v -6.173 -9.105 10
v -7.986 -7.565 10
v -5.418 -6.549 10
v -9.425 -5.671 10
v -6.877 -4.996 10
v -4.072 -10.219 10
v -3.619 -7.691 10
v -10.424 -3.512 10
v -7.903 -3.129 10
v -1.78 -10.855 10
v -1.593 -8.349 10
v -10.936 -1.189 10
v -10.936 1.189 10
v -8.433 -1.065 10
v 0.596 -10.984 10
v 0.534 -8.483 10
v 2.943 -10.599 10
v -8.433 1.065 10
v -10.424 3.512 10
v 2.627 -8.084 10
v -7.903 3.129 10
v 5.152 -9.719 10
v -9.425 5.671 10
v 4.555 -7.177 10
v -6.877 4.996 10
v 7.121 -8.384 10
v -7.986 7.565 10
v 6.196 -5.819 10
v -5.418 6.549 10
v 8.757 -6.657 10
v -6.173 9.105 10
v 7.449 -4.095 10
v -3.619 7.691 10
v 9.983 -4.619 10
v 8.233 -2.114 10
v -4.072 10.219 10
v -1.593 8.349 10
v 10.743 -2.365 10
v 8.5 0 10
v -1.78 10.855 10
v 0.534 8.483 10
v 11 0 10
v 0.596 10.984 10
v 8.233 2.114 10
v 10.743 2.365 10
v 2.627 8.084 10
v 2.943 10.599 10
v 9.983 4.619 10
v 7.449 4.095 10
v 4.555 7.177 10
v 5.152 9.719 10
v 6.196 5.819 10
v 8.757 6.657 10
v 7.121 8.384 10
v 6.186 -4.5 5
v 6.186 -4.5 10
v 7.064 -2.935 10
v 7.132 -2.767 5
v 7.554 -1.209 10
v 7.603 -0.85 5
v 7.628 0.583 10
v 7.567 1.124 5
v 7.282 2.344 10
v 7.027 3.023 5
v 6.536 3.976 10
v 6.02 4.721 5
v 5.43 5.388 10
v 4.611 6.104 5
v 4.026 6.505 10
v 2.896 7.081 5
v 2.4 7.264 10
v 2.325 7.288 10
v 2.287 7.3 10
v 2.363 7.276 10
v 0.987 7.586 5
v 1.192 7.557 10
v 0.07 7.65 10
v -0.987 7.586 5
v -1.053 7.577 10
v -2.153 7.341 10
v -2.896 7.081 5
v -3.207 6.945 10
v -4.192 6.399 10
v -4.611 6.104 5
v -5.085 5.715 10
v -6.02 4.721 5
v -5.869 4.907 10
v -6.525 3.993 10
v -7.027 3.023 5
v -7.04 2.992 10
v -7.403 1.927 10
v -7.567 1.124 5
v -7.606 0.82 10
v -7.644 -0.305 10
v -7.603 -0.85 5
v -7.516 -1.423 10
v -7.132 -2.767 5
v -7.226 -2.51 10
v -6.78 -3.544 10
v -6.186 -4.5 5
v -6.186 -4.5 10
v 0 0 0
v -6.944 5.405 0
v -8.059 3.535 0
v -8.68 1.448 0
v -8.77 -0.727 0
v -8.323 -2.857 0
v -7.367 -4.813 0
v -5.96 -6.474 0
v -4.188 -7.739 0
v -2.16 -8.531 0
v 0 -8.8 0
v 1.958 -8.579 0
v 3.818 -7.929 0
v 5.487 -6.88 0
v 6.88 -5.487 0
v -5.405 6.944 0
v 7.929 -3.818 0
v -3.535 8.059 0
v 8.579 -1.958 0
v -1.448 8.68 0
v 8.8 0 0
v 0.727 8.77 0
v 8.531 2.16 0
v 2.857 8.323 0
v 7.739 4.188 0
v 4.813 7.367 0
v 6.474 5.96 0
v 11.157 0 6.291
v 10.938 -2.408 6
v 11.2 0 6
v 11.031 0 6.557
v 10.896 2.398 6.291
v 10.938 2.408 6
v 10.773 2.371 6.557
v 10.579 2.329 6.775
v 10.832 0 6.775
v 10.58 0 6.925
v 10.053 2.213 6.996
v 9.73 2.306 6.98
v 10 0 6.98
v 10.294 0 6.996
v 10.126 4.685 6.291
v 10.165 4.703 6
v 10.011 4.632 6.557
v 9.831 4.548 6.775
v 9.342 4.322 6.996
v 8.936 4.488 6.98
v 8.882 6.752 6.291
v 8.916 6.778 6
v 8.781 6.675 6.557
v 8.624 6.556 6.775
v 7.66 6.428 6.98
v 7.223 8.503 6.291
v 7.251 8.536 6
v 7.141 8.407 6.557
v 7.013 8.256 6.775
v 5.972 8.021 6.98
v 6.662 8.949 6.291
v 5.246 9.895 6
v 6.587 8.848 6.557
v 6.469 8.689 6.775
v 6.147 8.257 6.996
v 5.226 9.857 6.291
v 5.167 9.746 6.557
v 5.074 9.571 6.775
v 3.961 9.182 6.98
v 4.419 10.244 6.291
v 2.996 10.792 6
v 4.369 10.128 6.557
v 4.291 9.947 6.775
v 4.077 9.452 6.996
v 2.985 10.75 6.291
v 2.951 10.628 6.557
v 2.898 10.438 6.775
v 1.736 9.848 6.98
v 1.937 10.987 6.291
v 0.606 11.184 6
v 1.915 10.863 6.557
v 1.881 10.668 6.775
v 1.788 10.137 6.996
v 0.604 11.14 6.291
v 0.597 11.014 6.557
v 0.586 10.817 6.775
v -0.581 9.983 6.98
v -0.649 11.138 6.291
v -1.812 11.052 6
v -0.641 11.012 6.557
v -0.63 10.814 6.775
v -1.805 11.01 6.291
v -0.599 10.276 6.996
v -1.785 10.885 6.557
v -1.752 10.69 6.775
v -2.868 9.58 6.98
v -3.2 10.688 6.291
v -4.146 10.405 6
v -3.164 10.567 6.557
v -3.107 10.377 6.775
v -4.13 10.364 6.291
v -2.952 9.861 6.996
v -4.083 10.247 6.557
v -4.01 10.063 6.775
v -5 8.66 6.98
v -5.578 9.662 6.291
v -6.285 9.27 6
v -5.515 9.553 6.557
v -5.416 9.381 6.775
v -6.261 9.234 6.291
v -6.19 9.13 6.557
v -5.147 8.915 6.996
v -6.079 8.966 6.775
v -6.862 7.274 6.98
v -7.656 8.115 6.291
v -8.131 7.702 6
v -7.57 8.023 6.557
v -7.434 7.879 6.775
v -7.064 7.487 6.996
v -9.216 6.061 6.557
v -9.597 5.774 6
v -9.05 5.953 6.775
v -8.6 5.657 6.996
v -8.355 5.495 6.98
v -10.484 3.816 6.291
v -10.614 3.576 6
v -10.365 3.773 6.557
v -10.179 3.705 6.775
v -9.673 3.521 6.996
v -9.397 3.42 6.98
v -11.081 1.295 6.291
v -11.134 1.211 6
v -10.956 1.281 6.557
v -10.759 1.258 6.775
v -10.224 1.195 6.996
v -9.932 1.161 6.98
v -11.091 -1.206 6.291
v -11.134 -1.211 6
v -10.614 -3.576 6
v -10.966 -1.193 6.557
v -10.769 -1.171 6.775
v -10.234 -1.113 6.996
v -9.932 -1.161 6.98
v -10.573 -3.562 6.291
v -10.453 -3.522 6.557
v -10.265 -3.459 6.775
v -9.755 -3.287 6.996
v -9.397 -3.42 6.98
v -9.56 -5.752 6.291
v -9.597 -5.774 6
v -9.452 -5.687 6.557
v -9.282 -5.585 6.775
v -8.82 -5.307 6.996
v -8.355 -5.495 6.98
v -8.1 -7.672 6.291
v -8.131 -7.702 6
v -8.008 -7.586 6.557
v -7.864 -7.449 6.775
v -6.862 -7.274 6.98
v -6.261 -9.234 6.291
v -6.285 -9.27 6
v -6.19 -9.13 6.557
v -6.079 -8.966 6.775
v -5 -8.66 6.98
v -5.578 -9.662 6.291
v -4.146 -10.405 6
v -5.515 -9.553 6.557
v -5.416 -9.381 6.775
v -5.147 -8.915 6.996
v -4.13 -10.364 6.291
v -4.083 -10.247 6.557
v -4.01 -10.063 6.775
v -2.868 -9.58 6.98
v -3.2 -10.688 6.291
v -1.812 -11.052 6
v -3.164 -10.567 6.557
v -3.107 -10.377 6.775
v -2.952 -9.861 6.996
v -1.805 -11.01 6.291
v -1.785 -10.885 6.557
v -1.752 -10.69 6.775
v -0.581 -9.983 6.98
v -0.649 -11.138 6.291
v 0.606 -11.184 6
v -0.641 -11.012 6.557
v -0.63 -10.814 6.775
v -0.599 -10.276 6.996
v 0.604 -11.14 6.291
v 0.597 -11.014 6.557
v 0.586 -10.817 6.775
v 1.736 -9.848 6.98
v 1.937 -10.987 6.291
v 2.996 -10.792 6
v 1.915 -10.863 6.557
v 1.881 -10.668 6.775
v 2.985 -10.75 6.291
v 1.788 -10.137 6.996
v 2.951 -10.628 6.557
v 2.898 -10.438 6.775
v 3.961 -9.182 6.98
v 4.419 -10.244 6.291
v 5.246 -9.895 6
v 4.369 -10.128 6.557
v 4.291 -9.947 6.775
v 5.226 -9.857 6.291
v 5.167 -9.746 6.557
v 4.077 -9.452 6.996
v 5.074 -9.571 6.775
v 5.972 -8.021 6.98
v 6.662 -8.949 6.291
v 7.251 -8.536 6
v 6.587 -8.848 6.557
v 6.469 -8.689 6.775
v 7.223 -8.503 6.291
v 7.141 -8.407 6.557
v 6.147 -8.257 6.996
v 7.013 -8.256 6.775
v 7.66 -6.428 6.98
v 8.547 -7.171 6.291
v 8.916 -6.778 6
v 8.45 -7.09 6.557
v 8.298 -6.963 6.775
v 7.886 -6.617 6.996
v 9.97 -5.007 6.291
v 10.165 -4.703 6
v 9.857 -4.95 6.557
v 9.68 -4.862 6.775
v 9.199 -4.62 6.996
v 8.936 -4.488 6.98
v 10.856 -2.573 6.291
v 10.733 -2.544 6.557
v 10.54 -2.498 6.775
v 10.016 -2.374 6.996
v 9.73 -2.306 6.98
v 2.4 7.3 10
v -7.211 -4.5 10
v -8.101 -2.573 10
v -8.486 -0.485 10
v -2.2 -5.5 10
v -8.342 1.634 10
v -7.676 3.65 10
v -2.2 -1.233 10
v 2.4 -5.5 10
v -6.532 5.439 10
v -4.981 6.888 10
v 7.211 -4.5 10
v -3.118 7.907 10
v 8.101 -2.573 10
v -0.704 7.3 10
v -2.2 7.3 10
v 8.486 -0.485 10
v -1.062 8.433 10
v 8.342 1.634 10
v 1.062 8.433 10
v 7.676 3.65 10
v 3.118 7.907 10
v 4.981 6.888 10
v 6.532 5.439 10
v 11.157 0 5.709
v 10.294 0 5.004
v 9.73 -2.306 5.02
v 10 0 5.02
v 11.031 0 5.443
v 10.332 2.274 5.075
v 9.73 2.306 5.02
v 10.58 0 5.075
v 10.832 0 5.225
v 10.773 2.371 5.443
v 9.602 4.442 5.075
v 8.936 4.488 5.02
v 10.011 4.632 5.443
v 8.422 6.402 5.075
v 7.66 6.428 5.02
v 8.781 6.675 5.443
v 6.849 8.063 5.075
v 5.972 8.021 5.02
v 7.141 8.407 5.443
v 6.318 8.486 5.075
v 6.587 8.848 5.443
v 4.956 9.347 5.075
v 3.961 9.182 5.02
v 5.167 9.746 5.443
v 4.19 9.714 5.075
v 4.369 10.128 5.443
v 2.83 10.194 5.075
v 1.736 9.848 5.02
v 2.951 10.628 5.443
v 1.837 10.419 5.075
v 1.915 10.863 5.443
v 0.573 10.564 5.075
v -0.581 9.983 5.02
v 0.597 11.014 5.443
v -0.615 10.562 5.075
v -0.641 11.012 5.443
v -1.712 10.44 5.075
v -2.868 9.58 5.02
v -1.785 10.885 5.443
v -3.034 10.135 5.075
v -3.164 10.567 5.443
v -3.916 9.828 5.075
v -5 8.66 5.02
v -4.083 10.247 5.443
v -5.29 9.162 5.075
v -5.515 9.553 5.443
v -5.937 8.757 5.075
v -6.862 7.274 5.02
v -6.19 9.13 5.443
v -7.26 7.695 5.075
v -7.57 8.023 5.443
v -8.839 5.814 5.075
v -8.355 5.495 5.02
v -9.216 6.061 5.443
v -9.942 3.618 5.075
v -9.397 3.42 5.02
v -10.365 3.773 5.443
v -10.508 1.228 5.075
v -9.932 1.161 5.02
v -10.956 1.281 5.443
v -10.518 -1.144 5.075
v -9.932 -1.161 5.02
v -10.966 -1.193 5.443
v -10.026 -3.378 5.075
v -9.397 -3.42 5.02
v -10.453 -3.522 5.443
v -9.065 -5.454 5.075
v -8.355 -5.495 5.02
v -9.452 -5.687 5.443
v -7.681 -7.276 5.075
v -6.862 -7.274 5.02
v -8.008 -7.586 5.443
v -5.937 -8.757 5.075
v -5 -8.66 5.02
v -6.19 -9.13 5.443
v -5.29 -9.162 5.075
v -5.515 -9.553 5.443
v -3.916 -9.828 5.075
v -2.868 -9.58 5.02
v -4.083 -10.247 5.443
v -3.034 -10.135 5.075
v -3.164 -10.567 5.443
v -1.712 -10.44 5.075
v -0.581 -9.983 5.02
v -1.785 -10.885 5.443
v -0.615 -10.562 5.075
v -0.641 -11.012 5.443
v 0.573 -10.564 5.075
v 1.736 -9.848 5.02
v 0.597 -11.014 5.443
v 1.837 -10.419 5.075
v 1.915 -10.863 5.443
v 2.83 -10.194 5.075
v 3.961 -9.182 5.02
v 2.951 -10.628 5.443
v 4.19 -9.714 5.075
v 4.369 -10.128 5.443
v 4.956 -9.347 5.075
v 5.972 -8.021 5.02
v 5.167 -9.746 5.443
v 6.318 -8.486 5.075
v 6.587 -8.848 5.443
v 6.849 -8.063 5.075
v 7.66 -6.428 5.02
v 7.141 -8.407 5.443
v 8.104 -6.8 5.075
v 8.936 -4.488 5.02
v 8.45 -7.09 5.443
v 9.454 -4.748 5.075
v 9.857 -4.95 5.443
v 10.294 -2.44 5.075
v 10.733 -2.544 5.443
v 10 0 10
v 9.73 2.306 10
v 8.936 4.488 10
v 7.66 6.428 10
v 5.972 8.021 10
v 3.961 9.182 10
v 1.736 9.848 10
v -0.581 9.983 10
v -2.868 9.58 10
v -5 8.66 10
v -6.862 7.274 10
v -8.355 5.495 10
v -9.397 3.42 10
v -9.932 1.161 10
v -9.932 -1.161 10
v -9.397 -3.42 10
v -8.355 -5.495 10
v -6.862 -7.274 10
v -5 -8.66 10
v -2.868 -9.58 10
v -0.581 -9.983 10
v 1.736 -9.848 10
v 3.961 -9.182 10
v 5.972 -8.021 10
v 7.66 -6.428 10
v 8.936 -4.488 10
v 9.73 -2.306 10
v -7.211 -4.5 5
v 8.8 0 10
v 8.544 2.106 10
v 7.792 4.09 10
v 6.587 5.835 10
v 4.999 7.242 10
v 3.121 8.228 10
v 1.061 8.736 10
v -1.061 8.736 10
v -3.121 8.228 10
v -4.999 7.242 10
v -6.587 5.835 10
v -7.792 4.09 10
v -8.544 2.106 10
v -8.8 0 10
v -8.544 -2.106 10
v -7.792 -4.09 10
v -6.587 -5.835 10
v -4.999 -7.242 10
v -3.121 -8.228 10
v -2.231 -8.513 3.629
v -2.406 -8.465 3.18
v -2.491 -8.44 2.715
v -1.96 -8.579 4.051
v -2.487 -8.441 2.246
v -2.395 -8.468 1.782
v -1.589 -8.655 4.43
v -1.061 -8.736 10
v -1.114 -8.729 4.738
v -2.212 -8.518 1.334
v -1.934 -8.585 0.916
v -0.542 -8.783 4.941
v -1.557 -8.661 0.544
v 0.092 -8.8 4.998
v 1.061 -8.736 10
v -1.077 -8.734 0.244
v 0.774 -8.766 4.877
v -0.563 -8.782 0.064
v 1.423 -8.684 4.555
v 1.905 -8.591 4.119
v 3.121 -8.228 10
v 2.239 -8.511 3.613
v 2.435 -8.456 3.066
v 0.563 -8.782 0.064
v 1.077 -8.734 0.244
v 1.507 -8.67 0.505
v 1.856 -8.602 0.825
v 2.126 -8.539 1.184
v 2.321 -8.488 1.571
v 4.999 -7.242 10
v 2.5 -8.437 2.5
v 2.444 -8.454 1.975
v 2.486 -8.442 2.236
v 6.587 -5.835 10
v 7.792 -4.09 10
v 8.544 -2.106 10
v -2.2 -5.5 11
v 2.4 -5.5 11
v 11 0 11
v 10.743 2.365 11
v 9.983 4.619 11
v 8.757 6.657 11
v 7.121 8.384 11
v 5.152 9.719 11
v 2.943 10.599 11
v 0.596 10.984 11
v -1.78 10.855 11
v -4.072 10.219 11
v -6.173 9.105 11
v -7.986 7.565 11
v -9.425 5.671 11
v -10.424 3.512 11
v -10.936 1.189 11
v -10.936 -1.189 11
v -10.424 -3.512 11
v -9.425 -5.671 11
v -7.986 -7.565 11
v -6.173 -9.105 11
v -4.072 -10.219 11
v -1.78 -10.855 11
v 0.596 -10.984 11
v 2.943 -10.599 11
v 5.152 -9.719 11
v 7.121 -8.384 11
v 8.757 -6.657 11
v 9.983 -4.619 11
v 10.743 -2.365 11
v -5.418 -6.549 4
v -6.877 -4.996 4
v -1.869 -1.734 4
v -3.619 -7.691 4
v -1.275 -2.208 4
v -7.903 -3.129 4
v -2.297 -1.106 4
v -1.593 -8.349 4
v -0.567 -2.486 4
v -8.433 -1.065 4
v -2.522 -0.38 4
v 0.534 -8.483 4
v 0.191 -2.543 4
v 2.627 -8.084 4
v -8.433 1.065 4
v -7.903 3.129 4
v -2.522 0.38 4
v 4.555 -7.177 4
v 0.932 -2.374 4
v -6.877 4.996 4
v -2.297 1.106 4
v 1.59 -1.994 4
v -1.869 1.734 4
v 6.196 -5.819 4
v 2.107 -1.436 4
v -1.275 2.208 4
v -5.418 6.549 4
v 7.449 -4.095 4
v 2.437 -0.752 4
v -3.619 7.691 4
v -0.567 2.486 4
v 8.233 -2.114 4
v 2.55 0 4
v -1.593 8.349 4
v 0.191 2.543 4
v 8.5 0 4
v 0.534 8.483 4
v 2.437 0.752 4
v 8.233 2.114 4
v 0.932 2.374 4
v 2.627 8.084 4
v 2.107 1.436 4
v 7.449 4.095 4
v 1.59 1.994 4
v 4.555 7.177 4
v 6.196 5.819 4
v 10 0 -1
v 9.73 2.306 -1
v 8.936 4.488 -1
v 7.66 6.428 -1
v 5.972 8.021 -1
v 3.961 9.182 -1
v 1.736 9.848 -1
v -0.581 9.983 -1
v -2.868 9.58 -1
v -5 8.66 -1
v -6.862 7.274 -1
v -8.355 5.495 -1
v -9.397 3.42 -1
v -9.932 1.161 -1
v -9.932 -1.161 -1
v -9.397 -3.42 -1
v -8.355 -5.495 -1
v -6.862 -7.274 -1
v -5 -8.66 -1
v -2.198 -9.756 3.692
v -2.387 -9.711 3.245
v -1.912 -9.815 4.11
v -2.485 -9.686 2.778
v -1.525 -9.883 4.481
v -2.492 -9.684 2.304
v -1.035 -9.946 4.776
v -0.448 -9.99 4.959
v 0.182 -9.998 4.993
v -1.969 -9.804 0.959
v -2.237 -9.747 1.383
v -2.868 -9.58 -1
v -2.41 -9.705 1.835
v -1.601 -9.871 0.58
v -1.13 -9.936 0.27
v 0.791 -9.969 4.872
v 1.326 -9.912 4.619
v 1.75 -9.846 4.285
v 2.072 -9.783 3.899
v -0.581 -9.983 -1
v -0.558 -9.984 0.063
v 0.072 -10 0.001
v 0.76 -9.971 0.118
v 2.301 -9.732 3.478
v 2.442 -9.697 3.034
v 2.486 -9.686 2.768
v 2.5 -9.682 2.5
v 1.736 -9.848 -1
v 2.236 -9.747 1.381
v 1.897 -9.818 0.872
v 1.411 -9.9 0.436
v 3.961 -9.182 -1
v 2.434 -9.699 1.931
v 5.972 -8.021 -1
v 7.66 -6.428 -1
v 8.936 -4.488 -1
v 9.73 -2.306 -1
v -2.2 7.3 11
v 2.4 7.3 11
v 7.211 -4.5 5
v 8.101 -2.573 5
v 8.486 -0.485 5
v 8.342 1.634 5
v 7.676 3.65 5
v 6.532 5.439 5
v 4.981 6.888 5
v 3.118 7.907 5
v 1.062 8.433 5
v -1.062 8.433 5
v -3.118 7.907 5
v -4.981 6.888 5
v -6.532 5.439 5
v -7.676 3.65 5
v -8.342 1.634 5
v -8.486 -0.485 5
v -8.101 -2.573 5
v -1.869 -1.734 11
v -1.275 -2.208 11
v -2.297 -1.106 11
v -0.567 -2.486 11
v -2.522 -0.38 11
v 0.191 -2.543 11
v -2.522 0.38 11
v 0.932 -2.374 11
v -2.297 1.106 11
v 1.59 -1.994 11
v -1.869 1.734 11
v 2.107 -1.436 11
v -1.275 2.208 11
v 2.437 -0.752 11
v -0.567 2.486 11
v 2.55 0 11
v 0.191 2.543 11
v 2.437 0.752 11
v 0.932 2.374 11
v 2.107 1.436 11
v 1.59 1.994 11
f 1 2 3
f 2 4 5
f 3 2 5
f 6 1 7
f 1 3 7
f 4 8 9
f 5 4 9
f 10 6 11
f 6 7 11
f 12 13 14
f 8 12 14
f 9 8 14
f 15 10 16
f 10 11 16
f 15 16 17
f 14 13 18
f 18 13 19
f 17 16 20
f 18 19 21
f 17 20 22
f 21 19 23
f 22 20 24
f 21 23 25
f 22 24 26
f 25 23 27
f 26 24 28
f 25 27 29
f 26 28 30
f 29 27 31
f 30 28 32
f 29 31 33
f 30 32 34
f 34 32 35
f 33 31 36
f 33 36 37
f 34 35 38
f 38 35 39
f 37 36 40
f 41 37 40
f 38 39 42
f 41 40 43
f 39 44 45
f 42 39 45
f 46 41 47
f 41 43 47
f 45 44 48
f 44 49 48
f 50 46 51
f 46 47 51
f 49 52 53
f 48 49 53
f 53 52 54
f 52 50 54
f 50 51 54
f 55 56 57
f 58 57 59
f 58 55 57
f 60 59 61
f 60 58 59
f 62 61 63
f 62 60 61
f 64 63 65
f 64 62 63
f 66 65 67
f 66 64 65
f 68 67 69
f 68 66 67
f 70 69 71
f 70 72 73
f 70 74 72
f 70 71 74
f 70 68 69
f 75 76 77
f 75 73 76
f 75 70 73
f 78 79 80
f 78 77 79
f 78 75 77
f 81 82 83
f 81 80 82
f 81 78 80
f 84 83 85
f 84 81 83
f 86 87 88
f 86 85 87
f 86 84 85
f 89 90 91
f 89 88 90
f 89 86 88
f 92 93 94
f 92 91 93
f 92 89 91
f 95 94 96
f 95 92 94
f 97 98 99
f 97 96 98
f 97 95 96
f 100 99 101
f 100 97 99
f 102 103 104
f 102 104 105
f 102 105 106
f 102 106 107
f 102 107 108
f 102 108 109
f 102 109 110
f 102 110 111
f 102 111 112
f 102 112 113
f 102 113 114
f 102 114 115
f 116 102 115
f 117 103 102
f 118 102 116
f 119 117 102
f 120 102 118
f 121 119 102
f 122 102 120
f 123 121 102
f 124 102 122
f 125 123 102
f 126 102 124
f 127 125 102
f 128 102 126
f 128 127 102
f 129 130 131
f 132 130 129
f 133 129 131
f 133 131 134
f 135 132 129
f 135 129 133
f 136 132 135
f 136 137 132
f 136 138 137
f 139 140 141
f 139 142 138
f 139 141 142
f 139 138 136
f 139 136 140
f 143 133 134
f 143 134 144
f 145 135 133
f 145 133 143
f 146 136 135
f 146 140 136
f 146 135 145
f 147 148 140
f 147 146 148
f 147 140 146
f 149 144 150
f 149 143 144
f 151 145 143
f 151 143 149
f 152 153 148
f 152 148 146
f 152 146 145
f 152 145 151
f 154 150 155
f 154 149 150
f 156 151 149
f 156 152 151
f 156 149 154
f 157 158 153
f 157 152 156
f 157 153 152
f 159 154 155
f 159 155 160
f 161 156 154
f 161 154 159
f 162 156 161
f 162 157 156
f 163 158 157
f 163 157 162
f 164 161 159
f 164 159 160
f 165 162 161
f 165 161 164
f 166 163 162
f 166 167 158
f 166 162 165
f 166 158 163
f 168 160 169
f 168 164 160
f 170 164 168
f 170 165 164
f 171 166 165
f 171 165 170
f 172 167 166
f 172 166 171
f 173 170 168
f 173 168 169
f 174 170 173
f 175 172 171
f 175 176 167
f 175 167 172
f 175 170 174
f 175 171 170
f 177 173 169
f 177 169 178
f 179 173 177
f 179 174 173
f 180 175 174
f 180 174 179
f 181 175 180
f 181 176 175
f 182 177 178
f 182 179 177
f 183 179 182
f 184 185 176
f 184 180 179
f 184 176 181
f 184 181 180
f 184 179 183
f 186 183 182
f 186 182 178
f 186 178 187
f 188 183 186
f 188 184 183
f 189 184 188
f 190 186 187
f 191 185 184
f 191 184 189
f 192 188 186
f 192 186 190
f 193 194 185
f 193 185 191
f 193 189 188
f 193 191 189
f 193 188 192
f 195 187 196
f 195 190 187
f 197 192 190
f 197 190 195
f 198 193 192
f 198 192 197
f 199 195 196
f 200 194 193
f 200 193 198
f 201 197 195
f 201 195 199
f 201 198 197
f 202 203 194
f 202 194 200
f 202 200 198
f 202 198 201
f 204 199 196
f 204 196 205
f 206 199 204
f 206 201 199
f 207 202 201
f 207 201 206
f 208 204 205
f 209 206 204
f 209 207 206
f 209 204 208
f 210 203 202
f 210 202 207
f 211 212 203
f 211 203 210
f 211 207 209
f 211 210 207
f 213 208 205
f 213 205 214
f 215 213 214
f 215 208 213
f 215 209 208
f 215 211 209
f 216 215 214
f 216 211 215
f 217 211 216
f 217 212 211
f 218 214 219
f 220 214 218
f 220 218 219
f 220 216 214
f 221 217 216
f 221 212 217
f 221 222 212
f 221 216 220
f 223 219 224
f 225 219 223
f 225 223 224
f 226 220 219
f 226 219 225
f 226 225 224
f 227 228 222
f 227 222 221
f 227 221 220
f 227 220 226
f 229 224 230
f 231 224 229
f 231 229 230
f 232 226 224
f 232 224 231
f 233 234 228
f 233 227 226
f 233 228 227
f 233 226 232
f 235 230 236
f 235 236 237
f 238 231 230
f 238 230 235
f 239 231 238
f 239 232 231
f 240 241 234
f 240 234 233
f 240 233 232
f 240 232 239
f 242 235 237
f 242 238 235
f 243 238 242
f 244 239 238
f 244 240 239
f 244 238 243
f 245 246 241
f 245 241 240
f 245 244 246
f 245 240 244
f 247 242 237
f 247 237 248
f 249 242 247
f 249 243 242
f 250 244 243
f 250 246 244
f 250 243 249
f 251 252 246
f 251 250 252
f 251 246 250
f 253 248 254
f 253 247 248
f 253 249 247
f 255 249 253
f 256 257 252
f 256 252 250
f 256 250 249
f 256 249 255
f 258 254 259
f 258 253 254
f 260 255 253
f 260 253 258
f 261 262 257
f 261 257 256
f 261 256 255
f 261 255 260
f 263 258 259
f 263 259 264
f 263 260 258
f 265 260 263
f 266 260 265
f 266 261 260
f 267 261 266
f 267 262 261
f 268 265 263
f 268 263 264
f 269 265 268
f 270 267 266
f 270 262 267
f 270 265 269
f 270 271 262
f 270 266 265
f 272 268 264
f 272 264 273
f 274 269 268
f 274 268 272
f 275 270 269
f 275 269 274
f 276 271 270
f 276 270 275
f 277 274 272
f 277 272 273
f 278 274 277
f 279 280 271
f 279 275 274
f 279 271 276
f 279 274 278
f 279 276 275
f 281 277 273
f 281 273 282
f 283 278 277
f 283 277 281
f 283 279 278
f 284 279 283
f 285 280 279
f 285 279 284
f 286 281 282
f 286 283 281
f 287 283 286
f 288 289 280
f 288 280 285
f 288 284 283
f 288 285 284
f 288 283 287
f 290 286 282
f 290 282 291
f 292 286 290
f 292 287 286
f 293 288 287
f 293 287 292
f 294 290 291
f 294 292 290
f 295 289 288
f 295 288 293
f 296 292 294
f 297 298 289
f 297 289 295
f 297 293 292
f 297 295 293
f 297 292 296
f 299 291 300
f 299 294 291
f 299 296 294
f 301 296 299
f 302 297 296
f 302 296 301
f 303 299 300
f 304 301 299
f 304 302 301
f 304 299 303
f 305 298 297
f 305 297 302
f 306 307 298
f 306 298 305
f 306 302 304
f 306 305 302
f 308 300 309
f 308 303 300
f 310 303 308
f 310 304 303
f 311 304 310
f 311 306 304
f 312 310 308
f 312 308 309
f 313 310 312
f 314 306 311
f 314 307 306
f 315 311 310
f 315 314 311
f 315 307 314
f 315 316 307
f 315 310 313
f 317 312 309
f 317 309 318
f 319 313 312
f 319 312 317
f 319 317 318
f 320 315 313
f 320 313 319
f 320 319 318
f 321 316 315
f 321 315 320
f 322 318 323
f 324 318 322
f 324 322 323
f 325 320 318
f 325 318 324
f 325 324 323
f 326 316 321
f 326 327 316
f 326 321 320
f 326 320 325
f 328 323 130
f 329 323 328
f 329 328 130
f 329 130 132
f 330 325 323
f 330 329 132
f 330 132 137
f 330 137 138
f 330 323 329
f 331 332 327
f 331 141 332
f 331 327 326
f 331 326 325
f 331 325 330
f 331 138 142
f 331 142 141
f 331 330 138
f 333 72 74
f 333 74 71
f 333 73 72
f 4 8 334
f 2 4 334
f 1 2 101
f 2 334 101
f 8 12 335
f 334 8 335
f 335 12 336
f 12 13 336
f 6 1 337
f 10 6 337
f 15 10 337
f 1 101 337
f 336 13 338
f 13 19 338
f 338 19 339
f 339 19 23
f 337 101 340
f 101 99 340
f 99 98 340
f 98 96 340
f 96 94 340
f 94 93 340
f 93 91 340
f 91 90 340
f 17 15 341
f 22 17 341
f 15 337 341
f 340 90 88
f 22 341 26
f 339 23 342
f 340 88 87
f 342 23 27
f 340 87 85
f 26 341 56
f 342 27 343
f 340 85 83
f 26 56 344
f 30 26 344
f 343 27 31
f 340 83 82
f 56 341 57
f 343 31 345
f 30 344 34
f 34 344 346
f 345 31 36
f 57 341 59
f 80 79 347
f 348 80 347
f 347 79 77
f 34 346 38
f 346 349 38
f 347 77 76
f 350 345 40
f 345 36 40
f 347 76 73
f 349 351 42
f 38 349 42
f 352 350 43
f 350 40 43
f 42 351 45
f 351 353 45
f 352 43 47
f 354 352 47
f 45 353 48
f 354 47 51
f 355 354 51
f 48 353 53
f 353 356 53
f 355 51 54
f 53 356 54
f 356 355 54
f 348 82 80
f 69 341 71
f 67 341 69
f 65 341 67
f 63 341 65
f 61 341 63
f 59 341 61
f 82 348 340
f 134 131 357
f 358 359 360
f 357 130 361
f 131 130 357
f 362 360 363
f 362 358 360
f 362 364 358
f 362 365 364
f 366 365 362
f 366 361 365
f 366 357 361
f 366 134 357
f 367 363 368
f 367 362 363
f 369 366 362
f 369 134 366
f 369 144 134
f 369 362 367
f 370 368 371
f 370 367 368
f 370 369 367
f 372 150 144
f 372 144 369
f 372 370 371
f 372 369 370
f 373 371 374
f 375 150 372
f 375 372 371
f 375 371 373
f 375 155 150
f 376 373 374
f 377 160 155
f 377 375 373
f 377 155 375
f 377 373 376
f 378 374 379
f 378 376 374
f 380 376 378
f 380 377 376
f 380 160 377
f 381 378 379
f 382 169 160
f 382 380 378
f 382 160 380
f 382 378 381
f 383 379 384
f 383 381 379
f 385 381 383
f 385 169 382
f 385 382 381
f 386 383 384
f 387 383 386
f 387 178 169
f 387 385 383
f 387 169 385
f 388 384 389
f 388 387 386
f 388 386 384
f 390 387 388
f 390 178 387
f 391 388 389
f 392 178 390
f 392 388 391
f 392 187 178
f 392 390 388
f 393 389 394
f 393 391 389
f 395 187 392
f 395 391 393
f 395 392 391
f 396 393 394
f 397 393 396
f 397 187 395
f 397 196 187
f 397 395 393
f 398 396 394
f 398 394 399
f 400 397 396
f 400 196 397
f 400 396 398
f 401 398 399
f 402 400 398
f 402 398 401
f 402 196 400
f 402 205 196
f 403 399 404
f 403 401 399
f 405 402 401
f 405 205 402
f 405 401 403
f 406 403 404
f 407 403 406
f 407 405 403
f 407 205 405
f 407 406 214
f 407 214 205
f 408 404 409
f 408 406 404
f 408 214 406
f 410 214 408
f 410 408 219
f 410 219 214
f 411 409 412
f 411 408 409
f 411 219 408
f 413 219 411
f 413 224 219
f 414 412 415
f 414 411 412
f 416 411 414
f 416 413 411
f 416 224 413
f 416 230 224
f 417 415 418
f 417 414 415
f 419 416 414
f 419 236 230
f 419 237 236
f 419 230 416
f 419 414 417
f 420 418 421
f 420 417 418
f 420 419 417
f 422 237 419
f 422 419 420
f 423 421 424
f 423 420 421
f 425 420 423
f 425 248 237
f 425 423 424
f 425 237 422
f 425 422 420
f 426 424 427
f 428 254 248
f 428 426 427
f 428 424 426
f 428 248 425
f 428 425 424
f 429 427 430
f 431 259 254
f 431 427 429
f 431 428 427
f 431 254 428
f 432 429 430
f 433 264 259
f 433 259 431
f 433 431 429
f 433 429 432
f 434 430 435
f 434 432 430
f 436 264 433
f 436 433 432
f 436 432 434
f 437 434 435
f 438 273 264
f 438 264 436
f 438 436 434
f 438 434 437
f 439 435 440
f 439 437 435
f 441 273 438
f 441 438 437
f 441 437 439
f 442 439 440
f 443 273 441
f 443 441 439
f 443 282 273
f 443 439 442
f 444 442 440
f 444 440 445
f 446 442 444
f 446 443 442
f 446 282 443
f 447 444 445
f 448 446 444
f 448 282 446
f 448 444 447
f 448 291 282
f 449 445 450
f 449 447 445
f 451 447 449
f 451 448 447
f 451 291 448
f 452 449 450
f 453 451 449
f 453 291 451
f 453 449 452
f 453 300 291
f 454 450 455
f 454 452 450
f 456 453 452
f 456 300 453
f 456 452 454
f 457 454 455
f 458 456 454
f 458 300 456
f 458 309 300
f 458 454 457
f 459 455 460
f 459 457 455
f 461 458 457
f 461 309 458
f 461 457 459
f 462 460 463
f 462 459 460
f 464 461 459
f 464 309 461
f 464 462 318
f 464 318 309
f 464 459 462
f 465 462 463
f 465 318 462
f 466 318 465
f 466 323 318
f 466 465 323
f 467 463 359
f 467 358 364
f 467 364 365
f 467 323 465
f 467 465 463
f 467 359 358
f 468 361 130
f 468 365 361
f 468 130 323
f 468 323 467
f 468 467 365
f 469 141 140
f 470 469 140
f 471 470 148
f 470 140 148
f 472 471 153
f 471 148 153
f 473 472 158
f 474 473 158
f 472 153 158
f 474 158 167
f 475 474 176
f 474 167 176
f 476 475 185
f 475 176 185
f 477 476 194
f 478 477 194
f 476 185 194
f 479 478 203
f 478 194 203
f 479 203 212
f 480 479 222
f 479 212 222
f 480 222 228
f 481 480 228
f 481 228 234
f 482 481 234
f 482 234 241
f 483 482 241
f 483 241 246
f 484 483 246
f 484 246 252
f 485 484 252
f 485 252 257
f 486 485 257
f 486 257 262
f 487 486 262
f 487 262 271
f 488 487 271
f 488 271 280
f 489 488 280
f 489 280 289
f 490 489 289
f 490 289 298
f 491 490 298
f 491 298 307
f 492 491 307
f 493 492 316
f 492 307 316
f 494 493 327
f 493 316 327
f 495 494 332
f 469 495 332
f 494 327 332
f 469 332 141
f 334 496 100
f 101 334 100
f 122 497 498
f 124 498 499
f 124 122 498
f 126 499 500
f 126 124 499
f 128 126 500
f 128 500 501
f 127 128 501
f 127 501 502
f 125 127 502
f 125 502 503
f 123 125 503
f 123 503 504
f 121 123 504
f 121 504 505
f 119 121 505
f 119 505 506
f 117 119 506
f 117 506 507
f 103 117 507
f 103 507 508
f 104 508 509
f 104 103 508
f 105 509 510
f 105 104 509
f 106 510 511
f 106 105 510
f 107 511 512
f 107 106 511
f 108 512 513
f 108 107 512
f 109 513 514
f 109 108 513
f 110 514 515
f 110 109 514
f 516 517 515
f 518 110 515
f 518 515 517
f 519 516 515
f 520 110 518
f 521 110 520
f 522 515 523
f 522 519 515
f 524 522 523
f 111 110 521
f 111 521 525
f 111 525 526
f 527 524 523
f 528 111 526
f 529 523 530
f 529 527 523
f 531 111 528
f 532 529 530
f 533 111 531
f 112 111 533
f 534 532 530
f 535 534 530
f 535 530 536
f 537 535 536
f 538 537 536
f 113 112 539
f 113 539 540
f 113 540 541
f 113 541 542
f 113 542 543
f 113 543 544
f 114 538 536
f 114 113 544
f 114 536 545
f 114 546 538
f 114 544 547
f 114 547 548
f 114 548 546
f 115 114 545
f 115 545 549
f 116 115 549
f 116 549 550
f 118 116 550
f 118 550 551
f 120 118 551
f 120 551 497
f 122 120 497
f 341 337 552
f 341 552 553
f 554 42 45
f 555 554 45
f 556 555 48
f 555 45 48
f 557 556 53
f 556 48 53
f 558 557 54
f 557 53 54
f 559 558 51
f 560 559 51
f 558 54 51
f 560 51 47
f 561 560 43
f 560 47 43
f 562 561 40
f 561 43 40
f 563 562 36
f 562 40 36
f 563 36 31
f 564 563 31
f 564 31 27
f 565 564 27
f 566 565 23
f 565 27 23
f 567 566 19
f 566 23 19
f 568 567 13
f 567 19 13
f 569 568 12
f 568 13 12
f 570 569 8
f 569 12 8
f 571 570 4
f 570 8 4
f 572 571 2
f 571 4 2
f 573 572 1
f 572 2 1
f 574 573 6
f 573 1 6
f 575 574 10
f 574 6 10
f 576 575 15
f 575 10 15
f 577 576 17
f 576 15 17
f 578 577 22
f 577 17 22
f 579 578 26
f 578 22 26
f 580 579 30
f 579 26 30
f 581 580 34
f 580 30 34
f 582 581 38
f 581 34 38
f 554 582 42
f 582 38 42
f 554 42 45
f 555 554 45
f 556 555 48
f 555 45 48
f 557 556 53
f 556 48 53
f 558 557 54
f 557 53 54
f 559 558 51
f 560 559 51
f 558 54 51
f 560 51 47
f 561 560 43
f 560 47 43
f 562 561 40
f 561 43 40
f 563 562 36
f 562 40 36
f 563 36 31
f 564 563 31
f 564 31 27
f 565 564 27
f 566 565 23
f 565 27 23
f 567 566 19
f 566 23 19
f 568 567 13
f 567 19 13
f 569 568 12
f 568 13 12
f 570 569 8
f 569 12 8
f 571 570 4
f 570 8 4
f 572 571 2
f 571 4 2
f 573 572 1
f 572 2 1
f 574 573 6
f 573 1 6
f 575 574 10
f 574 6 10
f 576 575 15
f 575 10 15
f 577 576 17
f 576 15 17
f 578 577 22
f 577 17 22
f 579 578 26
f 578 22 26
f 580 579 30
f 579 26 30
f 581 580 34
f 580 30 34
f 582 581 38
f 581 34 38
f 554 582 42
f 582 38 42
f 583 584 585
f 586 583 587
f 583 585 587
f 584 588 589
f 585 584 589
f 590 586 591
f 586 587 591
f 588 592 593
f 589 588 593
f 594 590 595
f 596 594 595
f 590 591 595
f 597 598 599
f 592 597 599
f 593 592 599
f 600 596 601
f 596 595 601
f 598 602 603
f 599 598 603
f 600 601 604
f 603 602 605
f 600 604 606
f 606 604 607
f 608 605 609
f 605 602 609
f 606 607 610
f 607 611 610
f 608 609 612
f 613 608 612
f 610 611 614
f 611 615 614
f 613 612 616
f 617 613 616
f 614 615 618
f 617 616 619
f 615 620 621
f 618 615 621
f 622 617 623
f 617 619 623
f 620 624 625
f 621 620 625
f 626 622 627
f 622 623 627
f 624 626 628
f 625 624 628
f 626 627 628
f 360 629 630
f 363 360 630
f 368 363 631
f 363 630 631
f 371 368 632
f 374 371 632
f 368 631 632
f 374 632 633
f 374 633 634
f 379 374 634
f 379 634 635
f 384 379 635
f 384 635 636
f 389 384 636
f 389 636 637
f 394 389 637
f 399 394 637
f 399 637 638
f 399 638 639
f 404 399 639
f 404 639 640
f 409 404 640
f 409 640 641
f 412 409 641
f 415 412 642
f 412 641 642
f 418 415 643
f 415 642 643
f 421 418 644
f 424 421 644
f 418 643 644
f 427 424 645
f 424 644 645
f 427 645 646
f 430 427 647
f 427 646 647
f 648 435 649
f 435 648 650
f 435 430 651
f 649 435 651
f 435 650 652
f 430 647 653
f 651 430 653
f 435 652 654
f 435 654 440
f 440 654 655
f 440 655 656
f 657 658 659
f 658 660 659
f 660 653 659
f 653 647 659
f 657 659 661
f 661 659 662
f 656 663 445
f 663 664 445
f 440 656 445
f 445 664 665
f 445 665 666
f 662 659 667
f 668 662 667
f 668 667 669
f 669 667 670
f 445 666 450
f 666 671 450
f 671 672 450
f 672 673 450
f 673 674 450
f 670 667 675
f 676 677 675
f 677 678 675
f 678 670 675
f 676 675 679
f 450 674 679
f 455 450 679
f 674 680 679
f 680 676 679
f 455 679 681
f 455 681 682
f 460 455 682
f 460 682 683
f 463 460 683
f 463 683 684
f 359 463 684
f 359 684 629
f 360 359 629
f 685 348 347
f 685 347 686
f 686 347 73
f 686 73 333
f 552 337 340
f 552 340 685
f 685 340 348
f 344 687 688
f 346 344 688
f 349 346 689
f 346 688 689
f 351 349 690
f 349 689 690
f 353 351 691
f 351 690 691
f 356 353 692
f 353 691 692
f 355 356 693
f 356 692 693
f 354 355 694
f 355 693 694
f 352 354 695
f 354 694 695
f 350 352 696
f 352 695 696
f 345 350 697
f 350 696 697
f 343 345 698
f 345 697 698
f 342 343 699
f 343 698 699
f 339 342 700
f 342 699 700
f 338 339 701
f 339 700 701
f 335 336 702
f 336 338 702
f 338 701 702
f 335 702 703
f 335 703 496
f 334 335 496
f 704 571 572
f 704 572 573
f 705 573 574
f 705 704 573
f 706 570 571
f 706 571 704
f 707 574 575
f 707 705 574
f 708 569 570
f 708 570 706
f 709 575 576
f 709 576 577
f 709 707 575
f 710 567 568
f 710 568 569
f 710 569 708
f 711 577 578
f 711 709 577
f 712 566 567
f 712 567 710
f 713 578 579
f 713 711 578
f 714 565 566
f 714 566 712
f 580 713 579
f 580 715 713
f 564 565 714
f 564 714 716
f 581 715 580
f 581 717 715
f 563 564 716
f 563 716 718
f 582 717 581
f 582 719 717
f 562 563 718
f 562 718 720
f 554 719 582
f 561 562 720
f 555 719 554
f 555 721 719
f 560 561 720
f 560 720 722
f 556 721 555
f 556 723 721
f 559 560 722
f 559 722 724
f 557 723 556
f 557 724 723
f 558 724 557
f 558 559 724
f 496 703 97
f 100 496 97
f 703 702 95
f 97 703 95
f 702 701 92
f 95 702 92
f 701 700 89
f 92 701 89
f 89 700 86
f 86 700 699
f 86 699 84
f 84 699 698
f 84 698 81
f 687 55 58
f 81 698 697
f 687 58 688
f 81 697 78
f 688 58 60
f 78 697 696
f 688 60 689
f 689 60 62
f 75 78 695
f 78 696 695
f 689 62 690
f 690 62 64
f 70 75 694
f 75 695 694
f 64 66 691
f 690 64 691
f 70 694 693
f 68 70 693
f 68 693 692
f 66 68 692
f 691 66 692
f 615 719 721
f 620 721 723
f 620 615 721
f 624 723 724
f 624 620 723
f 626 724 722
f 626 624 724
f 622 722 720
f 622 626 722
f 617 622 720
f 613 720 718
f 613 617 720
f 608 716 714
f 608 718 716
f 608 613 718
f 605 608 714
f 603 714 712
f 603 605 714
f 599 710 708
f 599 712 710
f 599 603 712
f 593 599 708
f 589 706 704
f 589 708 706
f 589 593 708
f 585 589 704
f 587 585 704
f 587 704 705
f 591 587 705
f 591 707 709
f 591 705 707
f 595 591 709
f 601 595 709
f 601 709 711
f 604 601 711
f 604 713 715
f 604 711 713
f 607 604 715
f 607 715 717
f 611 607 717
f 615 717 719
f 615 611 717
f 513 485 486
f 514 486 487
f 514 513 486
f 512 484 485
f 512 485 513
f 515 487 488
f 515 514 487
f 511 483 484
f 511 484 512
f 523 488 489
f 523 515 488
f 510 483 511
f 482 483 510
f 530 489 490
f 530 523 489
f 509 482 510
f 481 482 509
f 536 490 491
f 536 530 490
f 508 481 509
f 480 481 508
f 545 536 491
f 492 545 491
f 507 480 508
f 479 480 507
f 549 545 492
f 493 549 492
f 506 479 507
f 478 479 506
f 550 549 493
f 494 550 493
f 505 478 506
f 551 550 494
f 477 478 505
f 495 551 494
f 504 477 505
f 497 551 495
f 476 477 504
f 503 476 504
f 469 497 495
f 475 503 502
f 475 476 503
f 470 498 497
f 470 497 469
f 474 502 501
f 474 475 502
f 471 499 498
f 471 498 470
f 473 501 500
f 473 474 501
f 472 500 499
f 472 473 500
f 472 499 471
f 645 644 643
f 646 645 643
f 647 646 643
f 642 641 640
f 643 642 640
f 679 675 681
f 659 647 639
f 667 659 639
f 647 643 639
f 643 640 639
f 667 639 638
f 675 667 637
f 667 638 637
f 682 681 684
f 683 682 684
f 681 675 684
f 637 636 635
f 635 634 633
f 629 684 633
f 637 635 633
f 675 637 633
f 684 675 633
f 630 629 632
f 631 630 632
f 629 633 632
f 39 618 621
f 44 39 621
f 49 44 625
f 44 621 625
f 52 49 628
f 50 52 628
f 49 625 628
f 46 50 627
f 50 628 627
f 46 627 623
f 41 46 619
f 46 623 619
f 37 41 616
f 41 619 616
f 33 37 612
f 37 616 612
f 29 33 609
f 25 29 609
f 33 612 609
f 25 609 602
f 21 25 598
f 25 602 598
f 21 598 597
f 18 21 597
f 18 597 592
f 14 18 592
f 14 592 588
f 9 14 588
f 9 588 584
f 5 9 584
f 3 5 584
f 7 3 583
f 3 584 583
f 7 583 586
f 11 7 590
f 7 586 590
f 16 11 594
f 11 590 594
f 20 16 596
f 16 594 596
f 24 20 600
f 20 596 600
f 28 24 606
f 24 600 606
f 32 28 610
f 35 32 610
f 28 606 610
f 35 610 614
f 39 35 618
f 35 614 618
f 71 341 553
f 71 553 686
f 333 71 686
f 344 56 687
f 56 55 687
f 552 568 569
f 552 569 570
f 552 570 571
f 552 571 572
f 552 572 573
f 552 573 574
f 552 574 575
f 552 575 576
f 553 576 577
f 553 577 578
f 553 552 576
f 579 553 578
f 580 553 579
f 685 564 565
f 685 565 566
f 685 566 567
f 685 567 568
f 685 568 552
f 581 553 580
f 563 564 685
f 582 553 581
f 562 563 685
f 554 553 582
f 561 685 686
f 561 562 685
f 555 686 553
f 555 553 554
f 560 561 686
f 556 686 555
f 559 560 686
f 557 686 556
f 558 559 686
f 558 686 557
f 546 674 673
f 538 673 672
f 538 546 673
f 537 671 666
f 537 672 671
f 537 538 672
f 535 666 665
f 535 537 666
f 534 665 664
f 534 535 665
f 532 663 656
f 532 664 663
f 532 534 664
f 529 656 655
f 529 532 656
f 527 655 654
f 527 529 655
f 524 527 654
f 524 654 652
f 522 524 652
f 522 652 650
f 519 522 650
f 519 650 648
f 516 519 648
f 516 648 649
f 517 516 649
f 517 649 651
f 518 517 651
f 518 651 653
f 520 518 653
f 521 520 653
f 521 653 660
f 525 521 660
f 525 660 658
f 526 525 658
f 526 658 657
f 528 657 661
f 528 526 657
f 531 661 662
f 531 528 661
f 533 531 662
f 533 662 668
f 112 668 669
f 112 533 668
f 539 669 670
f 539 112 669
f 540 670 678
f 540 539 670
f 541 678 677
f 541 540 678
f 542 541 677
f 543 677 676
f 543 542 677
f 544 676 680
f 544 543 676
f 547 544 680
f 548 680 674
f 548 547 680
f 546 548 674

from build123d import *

# Parameters (mm, degrees)
TORUS_R                = 1
CYLINDER002_R          = 2.5
CYLINDER002_DEPTH      = 10
CYLINDER002_ROLL_ANGLE = 90
CYLINDER_R             = 8.8
CYLINDER_DEPTH         = 10
CYLINDER001_R          = 10
CYLINDER001_DEPTH      = 11
CYLINDER004_R          = 2.55
CYLINDER004_DEPTH      = 12
CYLINDER005_R          = 11
CYLINDER005_DEPTH      = 1
CYLINDER003_R          = 8.5
CYLINDER003_DEPTH      = 6
BOX001_W               = 4.6
BOX001_H               = 12.8
BOX001_DEPTH           = 3
CYLINDER008_R          = 11
CYLINDER008_DEPTH      = 1
BOX_W                  = 18
BOX_H                  = 7
BOX_DEPTH              = 7
CYLINDER007_R          = 7.65
CYLINDER007_DEPTH      = 5
CYLINDER006_R          = 8.5
CYLINDER006_DEPTH      = 5


with BuildPart() as torus:
    # Torus → Torus (revolve)
    with BuildSketch(Plane(origin=(0, 0, 6), x_dir=(1, 0, 0), z_dir=(0, -1, 0))):
        with Locations((10.2, 0)):
            Circle(TORUS_R)
    revolve(axis=Axis((0, 0, 6), (0, 0, 1)))


with BuildPart() as cylinder:
    # Cylinder002 → Cylinder002 (new body)
    with BuildSketch(Plane.XY):
        Circle(CYLINDER002_R)
    extrude(amount=CYLINDER002_DEPTH)


with BuildPart() as cylinder_1:
    # Cylinder002 roll: moved
    add(cylinder.part.rotate(Axis((0, 0, 0), (1, 0, 0)), CYLINDER002_ROLL_ANGLE))


with BuildPart() as cylinder_2:
    # Cylinder002 placement: moved
    add(cylinder_1.part.moved(Location((0, 0, 2.5))))


with BuildPart() as fusion:
    # Cylinder → Cylinder (new body)
    with BuildSketch(Plane.XY):
        Circle(CYLINDER_R)
    extrude(amount=CYLINDER_DEPTH)

    # Fusion: union Cylinder
    add(cylinder_2.part)


with BuildPart() as ir_box:
    # Cylinder001 → Cylinder001 (new body)
    with BuildSketch(Plane.XY.offset(-1)):
        Circle(CYLINDER001_R)
    extrude(amount=CYLINDER001_DEPTH)

    # Cut: cut Fusion
    add(fusion.part, mode=Mode.SUBTRACT)

    # Fusion001: union Torus
    add(torus.part)


with BuildPart() as zaklad_vnitrni:
    # Cylinder004 → Cylinder004 (new body)
    with BuildSketch(Plane.XY.offset(4)):
        Circle(CYLINDER004_R)
    extrude(amount=CYLINDER004_DEPTH)


with BuildPart() as zaklda_poklop:
    # Cylinder005 → Cylinder005 (new body)
    with BuildSketch(Plane.XY.offset(10)):
        Circle(CYLINDER005_R)
    extrude(amount=CYLINDER005_DEPTH)


with BuildPart() as ir_sender:
    # Cylinder003 → Cylinder003 (new body)
    with BuildSketch(Plane.XY.offset(4)):
        Circle(CYLINDER003_R)
    extrude(amount=CYLINDER003_DEPTH)

    # Fusion002: union zaklda-poklop
    add(zaklda_poklop.part)

    # Cut001: cut zaklad-vnitrni
    add(zaklad_vnitrni.part, mode=Mode.SUBTRACT)


with BuildPart() as cube001:
    # Box001 → Box001 (new body)
    with BuildSketch(Plane(origin=(-2.2, -5.5, 10), x_dir=(1, 0, 0), z_dir=(0, 0, 1))):
        with Locations((2.3, 6.4)):
            Rectangle(BOX001_W, BOX001_H)
    extrude(amount=BOX001_DEPTH)


with BuildPart() as zaklda_poklop001:
    # Cylinder008 → Cylinder008 (new body)
    with BuildSketch(Plane.XY.offset(10)):
        Circle(CYLINDER008_R)
    extrude(amount=CYLINDER008_DEPTH)


with BuildPart() as cube:
    # Box → Box (new body)
    with BuildSketch(Plane(origin=(-9, -11.5, 4), x_dir=(1, 0, 0), z_dir=(0, 0, 1))):
        with Locations((9, 3.5)):
            Rectangle(BOX_W, BOX_H)
    extrude(amount=BOX_DEPTH)


with BuildPart() as cylinder002:
    # Cylinder007 → Cylinder007 (new body)
    with BuildSketch(Plane.XY.offset(5)):
        Circle(CYLINDER007_R)
    extrude(amount=CYLINDER007_DEPTH)


with BuildPart() as ir_receiver:
    # Cylinder006 → Cylinder006 (new body)
    with BuildSketch(Plane.XY.offset(5)):
        Circle(CYLINDER006_R)
    extrude(amount=CYLINDER006_DEPTH)

    # Cut002: cut Cylinder002
    add(cylinder002.part, mode=Mode.SUBTRACT)

    # Cut003: cut Cube
    add(cube.part, mode=Mode.SUBTRACT)

    # Fusion003: union zaklda-poklop001
    add(zaklda_poklop001.part)

    # Cut004: cut Cube001
    add(cube001.part, mode=Mode.SUBTRACT)


solid = Compound([ir_box.part, ir_sender.part, ir_receiver.part])
